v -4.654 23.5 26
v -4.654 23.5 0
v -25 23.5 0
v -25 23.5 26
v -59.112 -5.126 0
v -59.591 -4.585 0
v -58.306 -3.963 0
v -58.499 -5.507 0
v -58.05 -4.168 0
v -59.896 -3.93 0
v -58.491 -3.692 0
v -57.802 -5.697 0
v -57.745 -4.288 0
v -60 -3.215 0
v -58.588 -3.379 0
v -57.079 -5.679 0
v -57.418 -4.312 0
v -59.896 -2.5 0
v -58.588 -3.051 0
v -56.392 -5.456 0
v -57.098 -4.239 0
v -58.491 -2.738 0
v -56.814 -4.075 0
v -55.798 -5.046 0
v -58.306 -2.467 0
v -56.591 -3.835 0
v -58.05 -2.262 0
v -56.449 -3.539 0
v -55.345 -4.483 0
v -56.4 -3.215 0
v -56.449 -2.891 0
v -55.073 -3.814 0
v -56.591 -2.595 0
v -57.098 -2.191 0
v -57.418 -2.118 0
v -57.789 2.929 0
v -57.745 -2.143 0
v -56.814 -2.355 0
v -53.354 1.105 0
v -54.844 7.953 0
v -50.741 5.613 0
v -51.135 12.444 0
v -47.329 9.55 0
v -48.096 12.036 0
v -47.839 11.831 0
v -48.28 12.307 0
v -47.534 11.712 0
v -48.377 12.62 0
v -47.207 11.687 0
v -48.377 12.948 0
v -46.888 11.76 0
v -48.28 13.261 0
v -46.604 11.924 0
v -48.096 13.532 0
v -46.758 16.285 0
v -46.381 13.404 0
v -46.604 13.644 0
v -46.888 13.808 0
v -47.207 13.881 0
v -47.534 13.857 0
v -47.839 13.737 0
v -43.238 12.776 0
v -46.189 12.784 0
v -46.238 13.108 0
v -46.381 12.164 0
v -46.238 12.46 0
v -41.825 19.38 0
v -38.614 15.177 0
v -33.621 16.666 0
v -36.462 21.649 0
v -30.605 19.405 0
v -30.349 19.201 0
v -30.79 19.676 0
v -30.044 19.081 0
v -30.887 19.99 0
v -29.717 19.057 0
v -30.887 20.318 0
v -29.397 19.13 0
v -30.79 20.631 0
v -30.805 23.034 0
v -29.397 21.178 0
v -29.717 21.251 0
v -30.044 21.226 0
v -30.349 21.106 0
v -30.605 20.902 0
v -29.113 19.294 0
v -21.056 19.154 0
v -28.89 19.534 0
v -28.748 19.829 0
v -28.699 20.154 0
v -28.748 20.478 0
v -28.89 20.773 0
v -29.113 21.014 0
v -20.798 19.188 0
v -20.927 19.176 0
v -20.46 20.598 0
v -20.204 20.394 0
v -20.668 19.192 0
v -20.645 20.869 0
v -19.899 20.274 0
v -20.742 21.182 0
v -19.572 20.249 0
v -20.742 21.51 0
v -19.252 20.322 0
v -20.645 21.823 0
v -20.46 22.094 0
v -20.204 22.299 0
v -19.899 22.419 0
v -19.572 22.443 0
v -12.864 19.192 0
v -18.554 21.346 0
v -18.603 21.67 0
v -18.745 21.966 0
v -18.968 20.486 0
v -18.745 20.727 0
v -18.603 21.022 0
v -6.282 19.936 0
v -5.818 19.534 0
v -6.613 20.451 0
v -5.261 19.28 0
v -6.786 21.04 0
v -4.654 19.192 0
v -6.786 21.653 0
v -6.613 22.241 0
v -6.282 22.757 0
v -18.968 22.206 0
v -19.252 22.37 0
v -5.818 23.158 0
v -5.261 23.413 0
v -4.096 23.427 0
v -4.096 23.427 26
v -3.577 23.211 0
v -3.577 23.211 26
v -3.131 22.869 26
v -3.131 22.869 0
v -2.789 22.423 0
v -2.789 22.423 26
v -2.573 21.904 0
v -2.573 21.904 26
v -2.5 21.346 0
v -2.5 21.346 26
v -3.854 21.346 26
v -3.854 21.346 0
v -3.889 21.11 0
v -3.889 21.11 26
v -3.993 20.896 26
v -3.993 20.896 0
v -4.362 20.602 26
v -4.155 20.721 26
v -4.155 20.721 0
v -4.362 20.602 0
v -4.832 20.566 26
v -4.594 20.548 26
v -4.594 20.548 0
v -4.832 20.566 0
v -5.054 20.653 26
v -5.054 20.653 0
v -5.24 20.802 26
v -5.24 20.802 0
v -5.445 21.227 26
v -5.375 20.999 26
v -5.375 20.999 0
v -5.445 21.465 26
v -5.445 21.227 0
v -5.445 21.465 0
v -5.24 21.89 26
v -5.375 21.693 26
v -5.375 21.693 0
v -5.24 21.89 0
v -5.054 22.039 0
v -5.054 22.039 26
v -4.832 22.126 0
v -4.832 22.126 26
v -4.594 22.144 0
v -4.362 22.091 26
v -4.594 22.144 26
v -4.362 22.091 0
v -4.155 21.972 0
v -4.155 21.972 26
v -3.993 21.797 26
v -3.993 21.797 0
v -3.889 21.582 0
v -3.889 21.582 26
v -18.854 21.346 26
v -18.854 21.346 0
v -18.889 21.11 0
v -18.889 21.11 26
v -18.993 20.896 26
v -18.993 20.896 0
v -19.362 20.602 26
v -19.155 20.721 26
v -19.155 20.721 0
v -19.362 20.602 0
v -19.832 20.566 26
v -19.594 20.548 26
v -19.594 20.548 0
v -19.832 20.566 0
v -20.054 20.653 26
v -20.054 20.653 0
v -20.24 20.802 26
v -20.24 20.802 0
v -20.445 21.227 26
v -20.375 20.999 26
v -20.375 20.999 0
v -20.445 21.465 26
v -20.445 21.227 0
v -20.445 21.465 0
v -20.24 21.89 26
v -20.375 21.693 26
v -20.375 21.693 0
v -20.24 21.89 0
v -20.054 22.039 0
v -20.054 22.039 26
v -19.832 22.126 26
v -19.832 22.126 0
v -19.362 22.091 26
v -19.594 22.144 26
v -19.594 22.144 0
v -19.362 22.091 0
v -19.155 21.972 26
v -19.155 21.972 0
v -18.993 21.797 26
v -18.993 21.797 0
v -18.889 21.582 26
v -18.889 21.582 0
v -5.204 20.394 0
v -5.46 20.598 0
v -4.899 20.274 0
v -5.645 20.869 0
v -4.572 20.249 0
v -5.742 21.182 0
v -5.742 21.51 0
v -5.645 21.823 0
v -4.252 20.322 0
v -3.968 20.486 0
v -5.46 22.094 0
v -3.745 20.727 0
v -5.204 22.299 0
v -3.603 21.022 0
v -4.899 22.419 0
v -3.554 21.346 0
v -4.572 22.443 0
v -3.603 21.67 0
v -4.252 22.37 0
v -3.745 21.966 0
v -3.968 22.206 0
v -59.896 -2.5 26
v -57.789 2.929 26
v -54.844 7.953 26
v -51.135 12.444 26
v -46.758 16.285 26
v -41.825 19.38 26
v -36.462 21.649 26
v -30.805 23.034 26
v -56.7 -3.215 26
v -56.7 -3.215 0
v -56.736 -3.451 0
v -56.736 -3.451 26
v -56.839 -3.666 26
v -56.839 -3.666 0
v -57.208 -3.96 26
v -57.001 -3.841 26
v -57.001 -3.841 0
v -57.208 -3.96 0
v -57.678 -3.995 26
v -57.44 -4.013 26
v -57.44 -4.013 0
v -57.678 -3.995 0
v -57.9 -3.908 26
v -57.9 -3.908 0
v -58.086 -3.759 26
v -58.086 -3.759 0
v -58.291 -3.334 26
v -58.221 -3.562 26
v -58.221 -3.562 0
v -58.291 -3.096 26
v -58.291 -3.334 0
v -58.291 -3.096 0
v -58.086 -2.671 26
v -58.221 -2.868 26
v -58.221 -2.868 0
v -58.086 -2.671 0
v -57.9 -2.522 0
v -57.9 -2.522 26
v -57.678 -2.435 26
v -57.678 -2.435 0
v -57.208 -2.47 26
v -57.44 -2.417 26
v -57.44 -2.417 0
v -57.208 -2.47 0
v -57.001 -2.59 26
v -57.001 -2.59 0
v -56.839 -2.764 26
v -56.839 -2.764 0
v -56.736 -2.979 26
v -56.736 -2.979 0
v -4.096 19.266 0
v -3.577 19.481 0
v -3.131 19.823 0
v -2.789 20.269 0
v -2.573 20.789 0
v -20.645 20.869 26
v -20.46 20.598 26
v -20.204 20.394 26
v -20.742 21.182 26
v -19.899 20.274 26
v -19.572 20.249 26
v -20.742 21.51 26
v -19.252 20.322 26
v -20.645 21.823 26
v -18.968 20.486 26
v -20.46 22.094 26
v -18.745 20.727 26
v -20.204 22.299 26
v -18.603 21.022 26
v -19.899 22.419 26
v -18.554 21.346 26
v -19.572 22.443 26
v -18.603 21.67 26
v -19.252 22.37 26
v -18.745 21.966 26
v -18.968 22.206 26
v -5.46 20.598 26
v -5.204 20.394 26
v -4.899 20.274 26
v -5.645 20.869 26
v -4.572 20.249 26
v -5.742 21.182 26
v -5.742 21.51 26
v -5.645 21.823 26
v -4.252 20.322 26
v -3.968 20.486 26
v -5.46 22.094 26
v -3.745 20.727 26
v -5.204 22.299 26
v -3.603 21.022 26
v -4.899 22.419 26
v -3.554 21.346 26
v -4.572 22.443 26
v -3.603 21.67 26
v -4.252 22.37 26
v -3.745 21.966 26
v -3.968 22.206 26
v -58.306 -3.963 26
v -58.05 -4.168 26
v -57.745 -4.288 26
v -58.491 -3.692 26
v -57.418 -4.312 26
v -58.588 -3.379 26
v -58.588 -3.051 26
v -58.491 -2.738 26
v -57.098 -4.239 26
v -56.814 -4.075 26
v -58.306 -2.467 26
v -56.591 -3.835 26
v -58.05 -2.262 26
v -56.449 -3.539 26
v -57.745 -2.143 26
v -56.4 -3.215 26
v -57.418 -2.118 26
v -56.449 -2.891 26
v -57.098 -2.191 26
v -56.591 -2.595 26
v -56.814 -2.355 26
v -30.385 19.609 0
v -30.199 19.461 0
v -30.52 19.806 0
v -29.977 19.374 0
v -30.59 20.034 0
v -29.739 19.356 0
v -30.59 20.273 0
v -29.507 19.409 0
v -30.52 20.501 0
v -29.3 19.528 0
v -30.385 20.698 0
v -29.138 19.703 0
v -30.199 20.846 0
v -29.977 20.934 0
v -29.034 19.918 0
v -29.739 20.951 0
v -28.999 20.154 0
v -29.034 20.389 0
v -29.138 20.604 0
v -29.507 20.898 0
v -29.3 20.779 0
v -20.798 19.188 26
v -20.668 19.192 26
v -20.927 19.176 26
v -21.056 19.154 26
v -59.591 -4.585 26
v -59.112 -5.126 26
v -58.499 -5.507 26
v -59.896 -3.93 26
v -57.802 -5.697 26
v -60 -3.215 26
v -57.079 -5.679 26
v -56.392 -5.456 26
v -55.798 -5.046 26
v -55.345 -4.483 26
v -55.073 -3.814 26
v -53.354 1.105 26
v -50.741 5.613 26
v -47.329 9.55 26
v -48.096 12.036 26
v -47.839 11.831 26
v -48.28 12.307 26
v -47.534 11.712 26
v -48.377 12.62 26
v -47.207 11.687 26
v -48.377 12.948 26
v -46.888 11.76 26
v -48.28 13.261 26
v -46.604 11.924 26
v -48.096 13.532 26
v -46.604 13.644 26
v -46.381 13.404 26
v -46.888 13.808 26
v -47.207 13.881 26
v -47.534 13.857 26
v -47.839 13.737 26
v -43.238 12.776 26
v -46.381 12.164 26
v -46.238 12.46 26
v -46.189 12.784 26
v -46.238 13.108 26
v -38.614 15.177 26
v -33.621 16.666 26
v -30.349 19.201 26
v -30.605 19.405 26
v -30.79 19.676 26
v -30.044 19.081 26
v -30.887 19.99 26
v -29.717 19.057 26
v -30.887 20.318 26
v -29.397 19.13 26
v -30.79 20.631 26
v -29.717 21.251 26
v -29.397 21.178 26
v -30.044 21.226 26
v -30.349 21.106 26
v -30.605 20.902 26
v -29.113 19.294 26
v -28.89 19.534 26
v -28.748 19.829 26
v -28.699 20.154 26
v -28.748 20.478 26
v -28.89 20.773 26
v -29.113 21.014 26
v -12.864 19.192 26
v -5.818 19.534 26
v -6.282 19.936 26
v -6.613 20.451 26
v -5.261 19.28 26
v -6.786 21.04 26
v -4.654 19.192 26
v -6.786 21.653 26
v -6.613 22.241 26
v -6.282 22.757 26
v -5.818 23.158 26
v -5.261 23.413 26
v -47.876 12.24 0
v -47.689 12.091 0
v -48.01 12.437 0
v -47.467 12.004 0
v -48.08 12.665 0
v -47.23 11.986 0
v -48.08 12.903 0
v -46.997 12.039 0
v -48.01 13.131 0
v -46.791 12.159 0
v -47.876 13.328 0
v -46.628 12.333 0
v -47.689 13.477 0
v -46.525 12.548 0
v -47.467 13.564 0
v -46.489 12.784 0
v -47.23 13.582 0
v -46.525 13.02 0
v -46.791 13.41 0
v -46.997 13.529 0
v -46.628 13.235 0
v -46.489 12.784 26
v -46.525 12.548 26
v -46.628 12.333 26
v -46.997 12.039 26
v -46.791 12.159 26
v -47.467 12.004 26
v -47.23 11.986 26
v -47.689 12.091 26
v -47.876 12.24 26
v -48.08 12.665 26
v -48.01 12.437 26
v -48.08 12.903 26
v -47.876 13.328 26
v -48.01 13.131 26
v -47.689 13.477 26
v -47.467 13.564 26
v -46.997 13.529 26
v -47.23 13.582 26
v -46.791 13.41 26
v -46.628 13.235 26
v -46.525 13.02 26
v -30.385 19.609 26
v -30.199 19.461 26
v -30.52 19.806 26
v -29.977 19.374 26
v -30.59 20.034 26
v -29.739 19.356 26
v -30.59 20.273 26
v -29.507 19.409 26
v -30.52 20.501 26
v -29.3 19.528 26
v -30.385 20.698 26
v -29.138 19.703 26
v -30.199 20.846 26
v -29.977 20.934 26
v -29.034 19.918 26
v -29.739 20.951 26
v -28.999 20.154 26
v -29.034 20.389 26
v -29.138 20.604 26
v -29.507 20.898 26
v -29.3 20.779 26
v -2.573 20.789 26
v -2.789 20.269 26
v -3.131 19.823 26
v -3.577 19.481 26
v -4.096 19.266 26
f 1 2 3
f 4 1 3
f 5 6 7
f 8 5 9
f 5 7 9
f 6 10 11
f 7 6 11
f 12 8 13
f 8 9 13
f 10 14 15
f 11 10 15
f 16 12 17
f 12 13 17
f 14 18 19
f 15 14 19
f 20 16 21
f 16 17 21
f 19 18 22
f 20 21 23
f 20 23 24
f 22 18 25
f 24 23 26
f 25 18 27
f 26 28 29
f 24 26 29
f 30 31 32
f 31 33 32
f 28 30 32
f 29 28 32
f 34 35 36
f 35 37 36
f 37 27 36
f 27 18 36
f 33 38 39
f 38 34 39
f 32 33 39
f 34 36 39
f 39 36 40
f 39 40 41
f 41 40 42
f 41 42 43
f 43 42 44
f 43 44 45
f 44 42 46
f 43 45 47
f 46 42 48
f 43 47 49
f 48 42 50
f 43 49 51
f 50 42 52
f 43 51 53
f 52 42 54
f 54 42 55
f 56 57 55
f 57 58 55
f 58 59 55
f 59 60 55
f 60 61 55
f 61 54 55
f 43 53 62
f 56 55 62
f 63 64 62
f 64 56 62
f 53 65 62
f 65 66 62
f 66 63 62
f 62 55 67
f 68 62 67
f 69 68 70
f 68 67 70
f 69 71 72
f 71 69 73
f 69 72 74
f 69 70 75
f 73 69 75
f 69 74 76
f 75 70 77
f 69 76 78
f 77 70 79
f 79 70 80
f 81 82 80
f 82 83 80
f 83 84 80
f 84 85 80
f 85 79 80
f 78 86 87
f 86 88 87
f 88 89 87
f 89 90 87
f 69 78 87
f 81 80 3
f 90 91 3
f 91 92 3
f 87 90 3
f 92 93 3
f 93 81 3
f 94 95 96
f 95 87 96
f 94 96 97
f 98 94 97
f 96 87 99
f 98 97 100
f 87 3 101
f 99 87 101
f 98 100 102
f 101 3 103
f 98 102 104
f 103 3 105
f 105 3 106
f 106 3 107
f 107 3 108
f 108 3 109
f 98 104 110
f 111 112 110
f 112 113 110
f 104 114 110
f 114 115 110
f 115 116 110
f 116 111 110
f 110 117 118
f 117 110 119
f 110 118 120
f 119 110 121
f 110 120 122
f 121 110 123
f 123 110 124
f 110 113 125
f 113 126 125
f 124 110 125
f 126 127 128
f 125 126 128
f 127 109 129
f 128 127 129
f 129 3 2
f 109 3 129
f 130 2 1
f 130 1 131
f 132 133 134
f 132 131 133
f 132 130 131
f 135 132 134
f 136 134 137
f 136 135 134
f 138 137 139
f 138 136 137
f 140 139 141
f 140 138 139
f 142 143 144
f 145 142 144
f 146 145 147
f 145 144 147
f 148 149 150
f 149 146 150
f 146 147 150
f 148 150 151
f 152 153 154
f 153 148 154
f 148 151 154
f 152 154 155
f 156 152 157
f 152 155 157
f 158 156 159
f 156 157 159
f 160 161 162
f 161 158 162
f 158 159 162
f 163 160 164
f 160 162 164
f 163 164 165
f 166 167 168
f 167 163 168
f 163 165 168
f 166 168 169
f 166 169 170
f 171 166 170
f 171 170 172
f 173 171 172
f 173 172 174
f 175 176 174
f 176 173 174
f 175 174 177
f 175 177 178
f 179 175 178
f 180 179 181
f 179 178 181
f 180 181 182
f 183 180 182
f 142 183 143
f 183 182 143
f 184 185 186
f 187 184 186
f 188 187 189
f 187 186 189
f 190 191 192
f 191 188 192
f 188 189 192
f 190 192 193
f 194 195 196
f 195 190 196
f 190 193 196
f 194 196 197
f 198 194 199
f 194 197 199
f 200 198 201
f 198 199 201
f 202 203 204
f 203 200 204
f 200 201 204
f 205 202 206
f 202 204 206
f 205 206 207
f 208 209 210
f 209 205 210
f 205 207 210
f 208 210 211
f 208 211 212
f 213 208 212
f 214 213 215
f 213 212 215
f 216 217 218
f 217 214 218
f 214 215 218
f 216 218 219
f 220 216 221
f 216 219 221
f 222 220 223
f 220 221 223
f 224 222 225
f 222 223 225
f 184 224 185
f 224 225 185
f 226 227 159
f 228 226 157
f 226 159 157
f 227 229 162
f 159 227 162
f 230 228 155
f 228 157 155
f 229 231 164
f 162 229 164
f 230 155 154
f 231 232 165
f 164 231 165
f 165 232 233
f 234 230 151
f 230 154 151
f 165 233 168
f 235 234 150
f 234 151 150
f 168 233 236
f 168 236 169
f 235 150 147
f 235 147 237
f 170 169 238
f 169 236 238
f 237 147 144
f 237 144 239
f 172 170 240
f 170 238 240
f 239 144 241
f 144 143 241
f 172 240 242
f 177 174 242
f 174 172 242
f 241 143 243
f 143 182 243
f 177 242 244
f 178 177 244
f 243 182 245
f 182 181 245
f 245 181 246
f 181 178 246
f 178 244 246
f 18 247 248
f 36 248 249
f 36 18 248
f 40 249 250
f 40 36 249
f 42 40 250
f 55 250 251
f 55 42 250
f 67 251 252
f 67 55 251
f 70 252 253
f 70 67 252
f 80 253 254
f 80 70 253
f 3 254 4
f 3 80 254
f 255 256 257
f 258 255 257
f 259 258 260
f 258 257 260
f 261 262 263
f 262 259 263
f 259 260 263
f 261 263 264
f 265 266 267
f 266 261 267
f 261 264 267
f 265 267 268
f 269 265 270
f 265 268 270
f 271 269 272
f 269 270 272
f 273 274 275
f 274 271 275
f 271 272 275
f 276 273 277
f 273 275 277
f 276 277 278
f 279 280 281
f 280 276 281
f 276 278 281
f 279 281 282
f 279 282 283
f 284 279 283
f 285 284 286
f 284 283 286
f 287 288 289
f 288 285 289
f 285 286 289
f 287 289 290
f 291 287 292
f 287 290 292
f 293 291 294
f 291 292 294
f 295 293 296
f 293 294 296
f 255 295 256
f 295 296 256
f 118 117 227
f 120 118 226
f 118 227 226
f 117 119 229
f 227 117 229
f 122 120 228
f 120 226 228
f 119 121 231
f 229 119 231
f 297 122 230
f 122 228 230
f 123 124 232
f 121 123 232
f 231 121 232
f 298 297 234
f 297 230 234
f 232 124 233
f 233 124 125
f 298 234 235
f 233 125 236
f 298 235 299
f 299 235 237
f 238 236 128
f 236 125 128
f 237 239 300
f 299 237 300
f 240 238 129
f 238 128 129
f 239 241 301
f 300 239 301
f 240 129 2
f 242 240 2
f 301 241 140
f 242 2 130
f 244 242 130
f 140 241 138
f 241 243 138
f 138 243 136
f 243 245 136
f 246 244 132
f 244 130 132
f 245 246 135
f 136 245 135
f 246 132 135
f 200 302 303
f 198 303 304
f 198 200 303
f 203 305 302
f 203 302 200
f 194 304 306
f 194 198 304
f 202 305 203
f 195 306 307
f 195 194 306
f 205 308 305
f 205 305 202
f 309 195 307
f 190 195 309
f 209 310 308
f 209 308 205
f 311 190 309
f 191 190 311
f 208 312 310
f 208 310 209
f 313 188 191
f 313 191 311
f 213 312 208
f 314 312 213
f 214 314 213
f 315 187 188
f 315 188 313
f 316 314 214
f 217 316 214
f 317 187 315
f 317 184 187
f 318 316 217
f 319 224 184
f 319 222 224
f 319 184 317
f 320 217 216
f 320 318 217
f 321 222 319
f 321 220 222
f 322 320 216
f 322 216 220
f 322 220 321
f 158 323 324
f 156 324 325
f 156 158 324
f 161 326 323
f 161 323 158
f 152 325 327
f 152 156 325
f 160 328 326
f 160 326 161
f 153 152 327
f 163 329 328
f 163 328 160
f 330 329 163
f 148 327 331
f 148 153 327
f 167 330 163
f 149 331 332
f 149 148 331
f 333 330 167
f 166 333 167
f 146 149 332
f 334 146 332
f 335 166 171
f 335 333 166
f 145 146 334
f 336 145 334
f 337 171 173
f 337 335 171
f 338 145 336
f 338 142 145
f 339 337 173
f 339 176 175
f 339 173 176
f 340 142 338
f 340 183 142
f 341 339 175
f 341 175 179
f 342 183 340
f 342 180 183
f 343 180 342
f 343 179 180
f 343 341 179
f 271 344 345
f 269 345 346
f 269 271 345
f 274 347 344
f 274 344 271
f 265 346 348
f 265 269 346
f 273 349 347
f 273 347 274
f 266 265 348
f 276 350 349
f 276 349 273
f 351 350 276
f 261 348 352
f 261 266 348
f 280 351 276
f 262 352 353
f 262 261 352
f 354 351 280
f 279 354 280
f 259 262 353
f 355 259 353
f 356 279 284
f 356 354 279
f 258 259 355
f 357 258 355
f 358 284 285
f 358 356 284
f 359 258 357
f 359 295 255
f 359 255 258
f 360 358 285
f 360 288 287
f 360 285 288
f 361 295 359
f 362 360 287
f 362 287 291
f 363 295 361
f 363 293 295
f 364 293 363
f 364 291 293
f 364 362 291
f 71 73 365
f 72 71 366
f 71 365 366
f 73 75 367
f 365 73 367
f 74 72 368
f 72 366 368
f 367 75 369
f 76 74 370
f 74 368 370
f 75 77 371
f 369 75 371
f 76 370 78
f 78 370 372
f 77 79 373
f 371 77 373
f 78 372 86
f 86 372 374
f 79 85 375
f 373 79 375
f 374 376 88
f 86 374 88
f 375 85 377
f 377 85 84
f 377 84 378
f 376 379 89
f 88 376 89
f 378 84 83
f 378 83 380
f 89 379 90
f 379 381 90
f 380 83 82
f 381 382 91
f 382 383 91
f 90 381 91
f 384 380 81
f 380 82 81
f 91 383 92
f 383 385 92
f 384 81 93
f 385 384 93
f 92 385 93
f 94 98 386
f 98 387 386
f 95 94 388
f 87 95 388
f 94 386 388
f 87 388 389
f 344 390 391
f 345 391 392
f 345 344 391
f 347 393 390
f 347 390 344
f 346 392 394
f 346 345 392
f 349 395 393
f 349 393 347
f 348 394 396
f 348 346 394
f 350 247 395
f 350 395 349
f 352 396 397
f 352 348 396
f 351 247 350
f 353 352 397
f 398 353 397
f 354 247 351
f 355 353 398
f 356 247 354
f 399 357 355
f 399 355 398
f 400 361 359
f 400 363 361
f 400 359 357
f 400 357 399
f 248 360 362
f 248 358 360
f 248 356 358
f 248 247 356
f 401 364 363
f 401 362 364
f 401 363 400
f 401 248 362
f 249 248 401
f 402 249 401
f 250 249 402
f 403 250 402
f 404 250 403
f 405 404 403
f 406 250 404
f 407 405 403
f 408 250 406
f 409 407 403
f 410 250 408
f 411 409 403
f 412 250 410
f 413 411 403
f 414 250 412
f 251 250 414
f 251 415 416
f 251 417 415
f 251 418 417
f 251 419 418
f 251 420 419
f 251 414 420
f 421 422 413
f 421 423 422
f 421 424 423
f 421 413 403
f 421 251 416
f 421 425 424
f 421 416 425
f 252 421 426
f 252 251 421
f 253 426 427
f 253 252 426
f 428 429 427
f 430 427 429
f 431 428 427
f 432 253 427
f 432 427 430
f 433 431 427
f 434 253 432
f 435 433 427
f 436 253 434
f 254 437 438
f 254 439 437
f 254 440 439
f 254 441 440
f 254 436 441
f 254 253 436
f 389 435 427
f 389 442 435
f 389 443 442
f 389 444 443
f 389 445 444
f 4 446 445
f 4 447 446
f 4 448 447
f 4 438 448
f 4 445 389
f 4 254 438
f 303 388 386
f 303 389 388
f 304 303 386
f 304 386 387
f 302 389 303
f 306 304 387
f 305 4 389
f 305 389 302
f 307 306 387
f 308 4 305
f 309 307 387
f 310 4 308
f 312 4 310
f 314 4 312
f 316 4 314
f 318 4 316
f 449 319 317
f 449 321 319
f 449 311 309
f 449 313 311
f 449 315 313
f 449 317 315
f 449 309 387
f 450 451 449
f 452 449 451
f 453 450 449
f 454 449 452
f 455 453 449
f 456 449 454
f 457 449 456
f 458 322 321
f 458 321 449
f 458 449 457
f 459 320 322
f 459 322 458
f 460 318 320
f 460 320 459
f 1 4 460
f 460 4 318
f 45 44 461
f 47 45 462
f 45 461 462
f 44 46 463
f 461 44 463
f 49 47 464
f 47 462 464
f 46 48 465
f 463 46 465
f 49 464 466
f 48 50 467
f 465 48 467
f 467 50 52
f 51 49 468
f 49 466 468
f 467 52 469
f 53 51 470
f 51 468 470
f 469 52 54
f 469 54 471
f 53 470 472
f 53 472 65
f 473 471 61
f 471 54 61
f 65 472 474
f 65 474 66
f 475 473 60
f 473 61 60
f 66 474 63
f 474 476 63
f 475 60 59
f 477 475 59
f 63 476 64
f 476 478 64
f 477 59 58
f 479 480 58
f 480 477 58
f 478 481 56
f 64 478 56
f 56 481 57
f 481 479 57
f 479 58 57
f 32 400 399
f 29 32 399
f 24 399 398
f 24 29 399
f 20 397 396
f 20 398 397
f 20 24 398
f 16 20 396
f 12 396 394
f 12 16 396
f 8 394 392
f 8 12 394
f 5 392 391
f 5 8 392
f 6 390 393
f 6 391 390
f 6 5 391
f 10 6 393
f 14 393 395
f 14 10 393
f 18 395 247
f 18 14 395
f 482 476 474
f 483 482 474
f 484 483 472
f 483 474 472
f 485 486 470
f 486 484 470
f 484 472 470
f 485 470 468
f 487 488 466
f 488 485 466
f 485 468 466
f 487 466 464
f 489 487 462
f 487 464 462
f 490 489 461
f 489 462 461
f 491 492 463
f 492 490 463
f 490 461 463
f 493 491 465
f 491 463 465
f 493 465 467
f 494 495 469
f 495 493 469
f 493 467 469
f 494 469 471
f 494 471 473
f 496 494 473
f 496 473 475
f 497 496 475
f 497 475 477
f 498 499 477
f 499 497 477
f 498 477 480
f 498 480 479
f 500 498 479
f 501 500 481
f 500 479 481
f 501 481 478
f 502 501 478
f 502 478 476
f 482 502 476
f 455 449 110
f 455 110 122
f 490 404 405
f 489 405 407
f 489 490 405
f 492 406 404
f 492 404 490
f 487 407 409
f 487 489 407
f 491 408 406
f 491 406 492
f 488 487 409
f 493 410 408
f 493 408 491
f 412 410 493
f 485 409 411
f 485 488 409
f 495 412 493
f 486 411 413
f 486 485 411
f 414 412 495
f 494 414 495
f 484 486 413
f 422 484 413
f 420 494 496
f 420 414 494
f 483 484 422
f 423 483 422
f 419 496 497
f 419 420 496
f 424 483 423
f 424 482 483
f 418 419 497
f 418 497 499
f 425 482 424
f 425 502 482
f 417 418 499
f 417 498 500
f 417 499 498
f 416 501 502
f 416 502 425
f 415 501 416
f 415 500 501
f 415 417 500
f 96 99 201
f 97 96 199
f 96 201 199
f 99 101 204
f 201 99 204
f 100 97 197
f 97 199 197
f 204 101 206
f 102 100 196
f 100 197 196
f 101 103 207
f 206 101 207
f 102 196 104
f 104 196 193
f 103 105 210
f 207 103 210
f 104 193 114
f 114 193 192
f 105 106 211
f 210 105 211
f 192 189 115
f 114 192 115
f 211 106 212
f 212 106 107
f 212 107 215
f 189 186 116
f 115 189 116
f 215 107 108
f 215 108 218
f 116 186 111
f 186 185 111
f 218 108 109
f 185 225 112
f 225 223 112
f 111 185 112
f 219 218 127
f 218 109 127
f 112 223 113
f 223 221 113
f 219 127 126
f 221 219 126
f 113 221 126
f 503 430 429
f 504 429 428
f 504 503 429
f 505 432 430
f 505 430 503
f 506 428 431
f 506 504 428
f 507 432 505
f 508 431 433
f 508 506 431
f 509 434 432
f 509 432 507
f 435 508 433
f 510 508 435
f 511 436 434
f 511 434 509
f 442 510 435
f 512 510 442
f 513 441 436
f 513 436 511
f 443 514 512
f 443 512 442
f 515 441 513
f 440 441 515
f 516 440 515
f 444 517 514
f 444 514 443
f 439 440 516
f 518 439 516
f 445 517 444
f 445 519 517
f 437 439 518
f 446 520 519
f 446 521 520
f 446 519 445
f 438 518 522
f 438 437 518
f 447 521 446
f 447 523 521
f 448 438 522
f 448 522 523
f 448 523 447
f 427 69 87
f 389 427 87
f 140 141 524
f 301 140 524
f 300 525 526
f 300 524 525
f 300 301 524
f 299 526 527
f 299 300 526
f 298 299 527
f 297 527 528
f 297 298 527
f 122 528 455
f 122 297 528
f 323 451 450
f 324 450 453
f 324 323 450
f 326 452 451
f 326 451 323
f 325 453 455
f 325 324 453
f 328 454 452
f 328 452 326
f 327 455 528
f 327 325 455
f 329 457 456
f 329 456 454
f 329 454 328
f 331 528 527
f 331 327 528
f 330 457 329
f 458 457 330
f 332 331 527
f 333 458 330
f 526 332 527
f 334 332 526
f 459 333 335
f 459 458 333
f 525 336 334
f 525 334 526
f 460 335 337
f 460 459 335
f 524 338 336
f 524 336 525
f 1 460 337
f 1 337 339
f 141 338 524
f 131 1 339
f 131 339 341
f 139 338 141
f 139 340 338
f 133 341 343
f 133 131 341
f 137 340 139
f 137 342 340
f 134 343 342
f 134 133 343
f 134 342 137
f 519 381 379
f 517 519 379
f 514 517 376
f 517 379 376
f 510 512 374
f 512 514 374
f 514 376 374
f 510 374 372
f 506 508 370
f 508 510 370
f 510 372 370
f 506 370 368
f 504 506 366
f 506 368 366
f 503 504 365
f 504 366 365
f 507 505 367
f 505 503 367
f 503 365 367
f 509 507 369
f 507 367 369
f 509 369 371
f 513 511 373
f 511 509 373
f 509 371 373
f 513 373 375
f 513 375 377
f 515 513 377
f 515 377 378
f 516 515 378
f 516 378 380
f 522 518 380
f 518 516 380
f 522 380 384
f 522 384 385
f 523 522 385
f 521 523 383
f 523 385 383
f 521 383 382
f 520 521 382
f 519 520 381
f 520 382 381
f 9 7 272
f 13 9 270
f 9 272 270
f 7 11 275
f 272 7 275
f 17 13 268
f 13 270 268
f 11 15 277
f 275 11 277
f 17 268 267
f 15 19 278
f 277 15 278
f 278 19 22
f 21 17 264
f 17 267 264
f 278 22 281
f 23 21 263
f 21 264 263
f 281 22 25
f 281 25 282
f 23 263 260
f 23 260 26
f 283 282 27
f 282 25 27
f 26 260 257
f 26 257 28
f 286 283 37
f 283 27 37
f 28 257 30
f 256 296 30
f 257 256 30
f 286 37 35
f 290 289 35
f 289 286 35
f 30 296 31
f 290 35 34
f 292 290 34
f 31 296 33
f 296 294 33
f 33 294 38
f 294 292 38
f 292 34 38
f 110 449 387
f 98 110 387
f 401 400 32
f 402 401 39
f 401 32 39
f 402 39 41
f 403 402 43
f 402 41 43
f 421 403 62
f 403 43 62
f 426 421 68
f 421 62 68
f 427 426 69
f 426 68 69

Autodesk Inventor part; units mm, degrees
ref_plane "YZ Plane" through (0, 0, 0) normal (1, 0, 0) x (0, 1, 0)
ref_plane "XZ Plane" through (0, 0, 0) normal (0, 1, 0) x (-1, 0, 0)
sketch "スケッチ1" plane through (0, 0, 0) normal (0, 0, 1) x (1, 0, 0)
  circle A0 centre (-4.6538, 21.3462) radius 1.1 projected
  circle A1 centre (-19.6538, 21.3462) radius 1.1 projected
  line L0 (0.5, 16.7574) -> (0.5, 6.421) projected
  arc A2 (-3.1924, 5.3553) -> (0.5, 6.421) centre (-1.5, 6.421) ccw projected
  arc A3 (-3.1924, 5.3553) -> (-13.8372, 15.4455) centre (-28.2569, -10.4267) ccw projected
  arc A4 (-12.8636, 19.1925) -> (-13.8372, 15.4455) centre (-12.8636, 17.1925) ccw projected
  line L1 (-12.8636, 19.1925) -> (-2.3985, 19.1925) projected
  arc A5 (-1.3325, 18.8847) -> (-2.3985, 19.1925) centre (-2.3985, 17.1925) ccw projected
  arc A6 (-1.3325, 18.8847) -> (-0.8333, 18.643) centre (0, 21) ccw projected
  arc A7 (0.5, 16.7574) -> (-0.8333, 18.643) centre (-1.5, 16.7574) ccw projected
  arc A8 (-2.3454, -0.8655) -> (2.5, 0) centre (0, 0) ccw projected
  line L2 (2.5, 0) -> (2.5, 16.5) projected
  arc A9 (4.5, 18.5) -> (2.5, 16.5) centre (4.5, 16.5) ccw projected
  line L3 (4.5, 18.5) -> (21, 18.5) projected
  arc A10 (21, 18.5) -> (21, 23.5) centre (21, 21) ccw projected
  line L4 (21, 23.5) -> (-25, 23.5) projected
  arc A11 (-25, 23.5) -> (-59.8955, -2.5) centre (-25, -12.9173) ccw projected
  arc A12 (-59.8955, -2.5) -> (-55.0727, -3.8137) centre (-57.5, -3.2151) ccw projected
  arc A13 (-2.3454, -0.8655) -> (-55.0727, -3.8137) centre (-28.2569, -10.4267) ccw projected
  circle A14 centre (0, 0) radius 1.1 projected
  circle A15 centre (-47.2894, 12.7841) radius 1.1 projected
  circle A16 centre (-29.7988, 20.1536) radius 1.1 projected
  circle A17 centre (0, 21) radius 1.1 projected
  circle A18 centre (-57.5, -3.2151) radius 1.1 projected
  circle A19 centre (21, 21) radius 1.1 projected
  line L5 (-12.8636, 19.1925) -> (-20.8636, 19.1925)
  line L6 (-33.6212, 16.6665) -> (-20.8636, 19.1925)
  circle A20 centre (-57.5, -3.2151) radius 0.8
  circle A21 centre (-47.2894, 12.7841) radius 0.8
  circle A22 centre (-29.7988, 20.1536) radius 0.8
  circle A23 centre (-19.6538, 21.3462) radius 0.8
  circle A24 centre (-4.6538, 21.3462) radius 0.8
  circle A25 centre (-4.6538, 21.3462) radius 2.1538
  point P0 (0, 0)
  point P1 (-4.6538, 19.1925)
  point P2 (-4.6538, 23.5)
  dimension "d0" = 8
  dimension "d1" = 1.6
  dimension "d2" = 1.6
  dimension "d3" = 1.6
  dimension "d4" = 1.6
  dimension "d5" = 1.6
ref_plane "作業平面1" through (-60, -5.7151, 26) normal (0, 0, -1) x (0, 1, 0)
extrude "押し出し1" add sketch "スケッチ1" along normal up to surface (26 mm away) contours A0 | A1 | L5 L6 A13 A12 A11 L4 A25 L1 | A25 | A15 | A16 | A18
fillet "フィレット1" radius 2 1 edges at (-20.8636, 19.1925, 13)
properties part number "tesaki_sukima" material "ABS プラスチック"
